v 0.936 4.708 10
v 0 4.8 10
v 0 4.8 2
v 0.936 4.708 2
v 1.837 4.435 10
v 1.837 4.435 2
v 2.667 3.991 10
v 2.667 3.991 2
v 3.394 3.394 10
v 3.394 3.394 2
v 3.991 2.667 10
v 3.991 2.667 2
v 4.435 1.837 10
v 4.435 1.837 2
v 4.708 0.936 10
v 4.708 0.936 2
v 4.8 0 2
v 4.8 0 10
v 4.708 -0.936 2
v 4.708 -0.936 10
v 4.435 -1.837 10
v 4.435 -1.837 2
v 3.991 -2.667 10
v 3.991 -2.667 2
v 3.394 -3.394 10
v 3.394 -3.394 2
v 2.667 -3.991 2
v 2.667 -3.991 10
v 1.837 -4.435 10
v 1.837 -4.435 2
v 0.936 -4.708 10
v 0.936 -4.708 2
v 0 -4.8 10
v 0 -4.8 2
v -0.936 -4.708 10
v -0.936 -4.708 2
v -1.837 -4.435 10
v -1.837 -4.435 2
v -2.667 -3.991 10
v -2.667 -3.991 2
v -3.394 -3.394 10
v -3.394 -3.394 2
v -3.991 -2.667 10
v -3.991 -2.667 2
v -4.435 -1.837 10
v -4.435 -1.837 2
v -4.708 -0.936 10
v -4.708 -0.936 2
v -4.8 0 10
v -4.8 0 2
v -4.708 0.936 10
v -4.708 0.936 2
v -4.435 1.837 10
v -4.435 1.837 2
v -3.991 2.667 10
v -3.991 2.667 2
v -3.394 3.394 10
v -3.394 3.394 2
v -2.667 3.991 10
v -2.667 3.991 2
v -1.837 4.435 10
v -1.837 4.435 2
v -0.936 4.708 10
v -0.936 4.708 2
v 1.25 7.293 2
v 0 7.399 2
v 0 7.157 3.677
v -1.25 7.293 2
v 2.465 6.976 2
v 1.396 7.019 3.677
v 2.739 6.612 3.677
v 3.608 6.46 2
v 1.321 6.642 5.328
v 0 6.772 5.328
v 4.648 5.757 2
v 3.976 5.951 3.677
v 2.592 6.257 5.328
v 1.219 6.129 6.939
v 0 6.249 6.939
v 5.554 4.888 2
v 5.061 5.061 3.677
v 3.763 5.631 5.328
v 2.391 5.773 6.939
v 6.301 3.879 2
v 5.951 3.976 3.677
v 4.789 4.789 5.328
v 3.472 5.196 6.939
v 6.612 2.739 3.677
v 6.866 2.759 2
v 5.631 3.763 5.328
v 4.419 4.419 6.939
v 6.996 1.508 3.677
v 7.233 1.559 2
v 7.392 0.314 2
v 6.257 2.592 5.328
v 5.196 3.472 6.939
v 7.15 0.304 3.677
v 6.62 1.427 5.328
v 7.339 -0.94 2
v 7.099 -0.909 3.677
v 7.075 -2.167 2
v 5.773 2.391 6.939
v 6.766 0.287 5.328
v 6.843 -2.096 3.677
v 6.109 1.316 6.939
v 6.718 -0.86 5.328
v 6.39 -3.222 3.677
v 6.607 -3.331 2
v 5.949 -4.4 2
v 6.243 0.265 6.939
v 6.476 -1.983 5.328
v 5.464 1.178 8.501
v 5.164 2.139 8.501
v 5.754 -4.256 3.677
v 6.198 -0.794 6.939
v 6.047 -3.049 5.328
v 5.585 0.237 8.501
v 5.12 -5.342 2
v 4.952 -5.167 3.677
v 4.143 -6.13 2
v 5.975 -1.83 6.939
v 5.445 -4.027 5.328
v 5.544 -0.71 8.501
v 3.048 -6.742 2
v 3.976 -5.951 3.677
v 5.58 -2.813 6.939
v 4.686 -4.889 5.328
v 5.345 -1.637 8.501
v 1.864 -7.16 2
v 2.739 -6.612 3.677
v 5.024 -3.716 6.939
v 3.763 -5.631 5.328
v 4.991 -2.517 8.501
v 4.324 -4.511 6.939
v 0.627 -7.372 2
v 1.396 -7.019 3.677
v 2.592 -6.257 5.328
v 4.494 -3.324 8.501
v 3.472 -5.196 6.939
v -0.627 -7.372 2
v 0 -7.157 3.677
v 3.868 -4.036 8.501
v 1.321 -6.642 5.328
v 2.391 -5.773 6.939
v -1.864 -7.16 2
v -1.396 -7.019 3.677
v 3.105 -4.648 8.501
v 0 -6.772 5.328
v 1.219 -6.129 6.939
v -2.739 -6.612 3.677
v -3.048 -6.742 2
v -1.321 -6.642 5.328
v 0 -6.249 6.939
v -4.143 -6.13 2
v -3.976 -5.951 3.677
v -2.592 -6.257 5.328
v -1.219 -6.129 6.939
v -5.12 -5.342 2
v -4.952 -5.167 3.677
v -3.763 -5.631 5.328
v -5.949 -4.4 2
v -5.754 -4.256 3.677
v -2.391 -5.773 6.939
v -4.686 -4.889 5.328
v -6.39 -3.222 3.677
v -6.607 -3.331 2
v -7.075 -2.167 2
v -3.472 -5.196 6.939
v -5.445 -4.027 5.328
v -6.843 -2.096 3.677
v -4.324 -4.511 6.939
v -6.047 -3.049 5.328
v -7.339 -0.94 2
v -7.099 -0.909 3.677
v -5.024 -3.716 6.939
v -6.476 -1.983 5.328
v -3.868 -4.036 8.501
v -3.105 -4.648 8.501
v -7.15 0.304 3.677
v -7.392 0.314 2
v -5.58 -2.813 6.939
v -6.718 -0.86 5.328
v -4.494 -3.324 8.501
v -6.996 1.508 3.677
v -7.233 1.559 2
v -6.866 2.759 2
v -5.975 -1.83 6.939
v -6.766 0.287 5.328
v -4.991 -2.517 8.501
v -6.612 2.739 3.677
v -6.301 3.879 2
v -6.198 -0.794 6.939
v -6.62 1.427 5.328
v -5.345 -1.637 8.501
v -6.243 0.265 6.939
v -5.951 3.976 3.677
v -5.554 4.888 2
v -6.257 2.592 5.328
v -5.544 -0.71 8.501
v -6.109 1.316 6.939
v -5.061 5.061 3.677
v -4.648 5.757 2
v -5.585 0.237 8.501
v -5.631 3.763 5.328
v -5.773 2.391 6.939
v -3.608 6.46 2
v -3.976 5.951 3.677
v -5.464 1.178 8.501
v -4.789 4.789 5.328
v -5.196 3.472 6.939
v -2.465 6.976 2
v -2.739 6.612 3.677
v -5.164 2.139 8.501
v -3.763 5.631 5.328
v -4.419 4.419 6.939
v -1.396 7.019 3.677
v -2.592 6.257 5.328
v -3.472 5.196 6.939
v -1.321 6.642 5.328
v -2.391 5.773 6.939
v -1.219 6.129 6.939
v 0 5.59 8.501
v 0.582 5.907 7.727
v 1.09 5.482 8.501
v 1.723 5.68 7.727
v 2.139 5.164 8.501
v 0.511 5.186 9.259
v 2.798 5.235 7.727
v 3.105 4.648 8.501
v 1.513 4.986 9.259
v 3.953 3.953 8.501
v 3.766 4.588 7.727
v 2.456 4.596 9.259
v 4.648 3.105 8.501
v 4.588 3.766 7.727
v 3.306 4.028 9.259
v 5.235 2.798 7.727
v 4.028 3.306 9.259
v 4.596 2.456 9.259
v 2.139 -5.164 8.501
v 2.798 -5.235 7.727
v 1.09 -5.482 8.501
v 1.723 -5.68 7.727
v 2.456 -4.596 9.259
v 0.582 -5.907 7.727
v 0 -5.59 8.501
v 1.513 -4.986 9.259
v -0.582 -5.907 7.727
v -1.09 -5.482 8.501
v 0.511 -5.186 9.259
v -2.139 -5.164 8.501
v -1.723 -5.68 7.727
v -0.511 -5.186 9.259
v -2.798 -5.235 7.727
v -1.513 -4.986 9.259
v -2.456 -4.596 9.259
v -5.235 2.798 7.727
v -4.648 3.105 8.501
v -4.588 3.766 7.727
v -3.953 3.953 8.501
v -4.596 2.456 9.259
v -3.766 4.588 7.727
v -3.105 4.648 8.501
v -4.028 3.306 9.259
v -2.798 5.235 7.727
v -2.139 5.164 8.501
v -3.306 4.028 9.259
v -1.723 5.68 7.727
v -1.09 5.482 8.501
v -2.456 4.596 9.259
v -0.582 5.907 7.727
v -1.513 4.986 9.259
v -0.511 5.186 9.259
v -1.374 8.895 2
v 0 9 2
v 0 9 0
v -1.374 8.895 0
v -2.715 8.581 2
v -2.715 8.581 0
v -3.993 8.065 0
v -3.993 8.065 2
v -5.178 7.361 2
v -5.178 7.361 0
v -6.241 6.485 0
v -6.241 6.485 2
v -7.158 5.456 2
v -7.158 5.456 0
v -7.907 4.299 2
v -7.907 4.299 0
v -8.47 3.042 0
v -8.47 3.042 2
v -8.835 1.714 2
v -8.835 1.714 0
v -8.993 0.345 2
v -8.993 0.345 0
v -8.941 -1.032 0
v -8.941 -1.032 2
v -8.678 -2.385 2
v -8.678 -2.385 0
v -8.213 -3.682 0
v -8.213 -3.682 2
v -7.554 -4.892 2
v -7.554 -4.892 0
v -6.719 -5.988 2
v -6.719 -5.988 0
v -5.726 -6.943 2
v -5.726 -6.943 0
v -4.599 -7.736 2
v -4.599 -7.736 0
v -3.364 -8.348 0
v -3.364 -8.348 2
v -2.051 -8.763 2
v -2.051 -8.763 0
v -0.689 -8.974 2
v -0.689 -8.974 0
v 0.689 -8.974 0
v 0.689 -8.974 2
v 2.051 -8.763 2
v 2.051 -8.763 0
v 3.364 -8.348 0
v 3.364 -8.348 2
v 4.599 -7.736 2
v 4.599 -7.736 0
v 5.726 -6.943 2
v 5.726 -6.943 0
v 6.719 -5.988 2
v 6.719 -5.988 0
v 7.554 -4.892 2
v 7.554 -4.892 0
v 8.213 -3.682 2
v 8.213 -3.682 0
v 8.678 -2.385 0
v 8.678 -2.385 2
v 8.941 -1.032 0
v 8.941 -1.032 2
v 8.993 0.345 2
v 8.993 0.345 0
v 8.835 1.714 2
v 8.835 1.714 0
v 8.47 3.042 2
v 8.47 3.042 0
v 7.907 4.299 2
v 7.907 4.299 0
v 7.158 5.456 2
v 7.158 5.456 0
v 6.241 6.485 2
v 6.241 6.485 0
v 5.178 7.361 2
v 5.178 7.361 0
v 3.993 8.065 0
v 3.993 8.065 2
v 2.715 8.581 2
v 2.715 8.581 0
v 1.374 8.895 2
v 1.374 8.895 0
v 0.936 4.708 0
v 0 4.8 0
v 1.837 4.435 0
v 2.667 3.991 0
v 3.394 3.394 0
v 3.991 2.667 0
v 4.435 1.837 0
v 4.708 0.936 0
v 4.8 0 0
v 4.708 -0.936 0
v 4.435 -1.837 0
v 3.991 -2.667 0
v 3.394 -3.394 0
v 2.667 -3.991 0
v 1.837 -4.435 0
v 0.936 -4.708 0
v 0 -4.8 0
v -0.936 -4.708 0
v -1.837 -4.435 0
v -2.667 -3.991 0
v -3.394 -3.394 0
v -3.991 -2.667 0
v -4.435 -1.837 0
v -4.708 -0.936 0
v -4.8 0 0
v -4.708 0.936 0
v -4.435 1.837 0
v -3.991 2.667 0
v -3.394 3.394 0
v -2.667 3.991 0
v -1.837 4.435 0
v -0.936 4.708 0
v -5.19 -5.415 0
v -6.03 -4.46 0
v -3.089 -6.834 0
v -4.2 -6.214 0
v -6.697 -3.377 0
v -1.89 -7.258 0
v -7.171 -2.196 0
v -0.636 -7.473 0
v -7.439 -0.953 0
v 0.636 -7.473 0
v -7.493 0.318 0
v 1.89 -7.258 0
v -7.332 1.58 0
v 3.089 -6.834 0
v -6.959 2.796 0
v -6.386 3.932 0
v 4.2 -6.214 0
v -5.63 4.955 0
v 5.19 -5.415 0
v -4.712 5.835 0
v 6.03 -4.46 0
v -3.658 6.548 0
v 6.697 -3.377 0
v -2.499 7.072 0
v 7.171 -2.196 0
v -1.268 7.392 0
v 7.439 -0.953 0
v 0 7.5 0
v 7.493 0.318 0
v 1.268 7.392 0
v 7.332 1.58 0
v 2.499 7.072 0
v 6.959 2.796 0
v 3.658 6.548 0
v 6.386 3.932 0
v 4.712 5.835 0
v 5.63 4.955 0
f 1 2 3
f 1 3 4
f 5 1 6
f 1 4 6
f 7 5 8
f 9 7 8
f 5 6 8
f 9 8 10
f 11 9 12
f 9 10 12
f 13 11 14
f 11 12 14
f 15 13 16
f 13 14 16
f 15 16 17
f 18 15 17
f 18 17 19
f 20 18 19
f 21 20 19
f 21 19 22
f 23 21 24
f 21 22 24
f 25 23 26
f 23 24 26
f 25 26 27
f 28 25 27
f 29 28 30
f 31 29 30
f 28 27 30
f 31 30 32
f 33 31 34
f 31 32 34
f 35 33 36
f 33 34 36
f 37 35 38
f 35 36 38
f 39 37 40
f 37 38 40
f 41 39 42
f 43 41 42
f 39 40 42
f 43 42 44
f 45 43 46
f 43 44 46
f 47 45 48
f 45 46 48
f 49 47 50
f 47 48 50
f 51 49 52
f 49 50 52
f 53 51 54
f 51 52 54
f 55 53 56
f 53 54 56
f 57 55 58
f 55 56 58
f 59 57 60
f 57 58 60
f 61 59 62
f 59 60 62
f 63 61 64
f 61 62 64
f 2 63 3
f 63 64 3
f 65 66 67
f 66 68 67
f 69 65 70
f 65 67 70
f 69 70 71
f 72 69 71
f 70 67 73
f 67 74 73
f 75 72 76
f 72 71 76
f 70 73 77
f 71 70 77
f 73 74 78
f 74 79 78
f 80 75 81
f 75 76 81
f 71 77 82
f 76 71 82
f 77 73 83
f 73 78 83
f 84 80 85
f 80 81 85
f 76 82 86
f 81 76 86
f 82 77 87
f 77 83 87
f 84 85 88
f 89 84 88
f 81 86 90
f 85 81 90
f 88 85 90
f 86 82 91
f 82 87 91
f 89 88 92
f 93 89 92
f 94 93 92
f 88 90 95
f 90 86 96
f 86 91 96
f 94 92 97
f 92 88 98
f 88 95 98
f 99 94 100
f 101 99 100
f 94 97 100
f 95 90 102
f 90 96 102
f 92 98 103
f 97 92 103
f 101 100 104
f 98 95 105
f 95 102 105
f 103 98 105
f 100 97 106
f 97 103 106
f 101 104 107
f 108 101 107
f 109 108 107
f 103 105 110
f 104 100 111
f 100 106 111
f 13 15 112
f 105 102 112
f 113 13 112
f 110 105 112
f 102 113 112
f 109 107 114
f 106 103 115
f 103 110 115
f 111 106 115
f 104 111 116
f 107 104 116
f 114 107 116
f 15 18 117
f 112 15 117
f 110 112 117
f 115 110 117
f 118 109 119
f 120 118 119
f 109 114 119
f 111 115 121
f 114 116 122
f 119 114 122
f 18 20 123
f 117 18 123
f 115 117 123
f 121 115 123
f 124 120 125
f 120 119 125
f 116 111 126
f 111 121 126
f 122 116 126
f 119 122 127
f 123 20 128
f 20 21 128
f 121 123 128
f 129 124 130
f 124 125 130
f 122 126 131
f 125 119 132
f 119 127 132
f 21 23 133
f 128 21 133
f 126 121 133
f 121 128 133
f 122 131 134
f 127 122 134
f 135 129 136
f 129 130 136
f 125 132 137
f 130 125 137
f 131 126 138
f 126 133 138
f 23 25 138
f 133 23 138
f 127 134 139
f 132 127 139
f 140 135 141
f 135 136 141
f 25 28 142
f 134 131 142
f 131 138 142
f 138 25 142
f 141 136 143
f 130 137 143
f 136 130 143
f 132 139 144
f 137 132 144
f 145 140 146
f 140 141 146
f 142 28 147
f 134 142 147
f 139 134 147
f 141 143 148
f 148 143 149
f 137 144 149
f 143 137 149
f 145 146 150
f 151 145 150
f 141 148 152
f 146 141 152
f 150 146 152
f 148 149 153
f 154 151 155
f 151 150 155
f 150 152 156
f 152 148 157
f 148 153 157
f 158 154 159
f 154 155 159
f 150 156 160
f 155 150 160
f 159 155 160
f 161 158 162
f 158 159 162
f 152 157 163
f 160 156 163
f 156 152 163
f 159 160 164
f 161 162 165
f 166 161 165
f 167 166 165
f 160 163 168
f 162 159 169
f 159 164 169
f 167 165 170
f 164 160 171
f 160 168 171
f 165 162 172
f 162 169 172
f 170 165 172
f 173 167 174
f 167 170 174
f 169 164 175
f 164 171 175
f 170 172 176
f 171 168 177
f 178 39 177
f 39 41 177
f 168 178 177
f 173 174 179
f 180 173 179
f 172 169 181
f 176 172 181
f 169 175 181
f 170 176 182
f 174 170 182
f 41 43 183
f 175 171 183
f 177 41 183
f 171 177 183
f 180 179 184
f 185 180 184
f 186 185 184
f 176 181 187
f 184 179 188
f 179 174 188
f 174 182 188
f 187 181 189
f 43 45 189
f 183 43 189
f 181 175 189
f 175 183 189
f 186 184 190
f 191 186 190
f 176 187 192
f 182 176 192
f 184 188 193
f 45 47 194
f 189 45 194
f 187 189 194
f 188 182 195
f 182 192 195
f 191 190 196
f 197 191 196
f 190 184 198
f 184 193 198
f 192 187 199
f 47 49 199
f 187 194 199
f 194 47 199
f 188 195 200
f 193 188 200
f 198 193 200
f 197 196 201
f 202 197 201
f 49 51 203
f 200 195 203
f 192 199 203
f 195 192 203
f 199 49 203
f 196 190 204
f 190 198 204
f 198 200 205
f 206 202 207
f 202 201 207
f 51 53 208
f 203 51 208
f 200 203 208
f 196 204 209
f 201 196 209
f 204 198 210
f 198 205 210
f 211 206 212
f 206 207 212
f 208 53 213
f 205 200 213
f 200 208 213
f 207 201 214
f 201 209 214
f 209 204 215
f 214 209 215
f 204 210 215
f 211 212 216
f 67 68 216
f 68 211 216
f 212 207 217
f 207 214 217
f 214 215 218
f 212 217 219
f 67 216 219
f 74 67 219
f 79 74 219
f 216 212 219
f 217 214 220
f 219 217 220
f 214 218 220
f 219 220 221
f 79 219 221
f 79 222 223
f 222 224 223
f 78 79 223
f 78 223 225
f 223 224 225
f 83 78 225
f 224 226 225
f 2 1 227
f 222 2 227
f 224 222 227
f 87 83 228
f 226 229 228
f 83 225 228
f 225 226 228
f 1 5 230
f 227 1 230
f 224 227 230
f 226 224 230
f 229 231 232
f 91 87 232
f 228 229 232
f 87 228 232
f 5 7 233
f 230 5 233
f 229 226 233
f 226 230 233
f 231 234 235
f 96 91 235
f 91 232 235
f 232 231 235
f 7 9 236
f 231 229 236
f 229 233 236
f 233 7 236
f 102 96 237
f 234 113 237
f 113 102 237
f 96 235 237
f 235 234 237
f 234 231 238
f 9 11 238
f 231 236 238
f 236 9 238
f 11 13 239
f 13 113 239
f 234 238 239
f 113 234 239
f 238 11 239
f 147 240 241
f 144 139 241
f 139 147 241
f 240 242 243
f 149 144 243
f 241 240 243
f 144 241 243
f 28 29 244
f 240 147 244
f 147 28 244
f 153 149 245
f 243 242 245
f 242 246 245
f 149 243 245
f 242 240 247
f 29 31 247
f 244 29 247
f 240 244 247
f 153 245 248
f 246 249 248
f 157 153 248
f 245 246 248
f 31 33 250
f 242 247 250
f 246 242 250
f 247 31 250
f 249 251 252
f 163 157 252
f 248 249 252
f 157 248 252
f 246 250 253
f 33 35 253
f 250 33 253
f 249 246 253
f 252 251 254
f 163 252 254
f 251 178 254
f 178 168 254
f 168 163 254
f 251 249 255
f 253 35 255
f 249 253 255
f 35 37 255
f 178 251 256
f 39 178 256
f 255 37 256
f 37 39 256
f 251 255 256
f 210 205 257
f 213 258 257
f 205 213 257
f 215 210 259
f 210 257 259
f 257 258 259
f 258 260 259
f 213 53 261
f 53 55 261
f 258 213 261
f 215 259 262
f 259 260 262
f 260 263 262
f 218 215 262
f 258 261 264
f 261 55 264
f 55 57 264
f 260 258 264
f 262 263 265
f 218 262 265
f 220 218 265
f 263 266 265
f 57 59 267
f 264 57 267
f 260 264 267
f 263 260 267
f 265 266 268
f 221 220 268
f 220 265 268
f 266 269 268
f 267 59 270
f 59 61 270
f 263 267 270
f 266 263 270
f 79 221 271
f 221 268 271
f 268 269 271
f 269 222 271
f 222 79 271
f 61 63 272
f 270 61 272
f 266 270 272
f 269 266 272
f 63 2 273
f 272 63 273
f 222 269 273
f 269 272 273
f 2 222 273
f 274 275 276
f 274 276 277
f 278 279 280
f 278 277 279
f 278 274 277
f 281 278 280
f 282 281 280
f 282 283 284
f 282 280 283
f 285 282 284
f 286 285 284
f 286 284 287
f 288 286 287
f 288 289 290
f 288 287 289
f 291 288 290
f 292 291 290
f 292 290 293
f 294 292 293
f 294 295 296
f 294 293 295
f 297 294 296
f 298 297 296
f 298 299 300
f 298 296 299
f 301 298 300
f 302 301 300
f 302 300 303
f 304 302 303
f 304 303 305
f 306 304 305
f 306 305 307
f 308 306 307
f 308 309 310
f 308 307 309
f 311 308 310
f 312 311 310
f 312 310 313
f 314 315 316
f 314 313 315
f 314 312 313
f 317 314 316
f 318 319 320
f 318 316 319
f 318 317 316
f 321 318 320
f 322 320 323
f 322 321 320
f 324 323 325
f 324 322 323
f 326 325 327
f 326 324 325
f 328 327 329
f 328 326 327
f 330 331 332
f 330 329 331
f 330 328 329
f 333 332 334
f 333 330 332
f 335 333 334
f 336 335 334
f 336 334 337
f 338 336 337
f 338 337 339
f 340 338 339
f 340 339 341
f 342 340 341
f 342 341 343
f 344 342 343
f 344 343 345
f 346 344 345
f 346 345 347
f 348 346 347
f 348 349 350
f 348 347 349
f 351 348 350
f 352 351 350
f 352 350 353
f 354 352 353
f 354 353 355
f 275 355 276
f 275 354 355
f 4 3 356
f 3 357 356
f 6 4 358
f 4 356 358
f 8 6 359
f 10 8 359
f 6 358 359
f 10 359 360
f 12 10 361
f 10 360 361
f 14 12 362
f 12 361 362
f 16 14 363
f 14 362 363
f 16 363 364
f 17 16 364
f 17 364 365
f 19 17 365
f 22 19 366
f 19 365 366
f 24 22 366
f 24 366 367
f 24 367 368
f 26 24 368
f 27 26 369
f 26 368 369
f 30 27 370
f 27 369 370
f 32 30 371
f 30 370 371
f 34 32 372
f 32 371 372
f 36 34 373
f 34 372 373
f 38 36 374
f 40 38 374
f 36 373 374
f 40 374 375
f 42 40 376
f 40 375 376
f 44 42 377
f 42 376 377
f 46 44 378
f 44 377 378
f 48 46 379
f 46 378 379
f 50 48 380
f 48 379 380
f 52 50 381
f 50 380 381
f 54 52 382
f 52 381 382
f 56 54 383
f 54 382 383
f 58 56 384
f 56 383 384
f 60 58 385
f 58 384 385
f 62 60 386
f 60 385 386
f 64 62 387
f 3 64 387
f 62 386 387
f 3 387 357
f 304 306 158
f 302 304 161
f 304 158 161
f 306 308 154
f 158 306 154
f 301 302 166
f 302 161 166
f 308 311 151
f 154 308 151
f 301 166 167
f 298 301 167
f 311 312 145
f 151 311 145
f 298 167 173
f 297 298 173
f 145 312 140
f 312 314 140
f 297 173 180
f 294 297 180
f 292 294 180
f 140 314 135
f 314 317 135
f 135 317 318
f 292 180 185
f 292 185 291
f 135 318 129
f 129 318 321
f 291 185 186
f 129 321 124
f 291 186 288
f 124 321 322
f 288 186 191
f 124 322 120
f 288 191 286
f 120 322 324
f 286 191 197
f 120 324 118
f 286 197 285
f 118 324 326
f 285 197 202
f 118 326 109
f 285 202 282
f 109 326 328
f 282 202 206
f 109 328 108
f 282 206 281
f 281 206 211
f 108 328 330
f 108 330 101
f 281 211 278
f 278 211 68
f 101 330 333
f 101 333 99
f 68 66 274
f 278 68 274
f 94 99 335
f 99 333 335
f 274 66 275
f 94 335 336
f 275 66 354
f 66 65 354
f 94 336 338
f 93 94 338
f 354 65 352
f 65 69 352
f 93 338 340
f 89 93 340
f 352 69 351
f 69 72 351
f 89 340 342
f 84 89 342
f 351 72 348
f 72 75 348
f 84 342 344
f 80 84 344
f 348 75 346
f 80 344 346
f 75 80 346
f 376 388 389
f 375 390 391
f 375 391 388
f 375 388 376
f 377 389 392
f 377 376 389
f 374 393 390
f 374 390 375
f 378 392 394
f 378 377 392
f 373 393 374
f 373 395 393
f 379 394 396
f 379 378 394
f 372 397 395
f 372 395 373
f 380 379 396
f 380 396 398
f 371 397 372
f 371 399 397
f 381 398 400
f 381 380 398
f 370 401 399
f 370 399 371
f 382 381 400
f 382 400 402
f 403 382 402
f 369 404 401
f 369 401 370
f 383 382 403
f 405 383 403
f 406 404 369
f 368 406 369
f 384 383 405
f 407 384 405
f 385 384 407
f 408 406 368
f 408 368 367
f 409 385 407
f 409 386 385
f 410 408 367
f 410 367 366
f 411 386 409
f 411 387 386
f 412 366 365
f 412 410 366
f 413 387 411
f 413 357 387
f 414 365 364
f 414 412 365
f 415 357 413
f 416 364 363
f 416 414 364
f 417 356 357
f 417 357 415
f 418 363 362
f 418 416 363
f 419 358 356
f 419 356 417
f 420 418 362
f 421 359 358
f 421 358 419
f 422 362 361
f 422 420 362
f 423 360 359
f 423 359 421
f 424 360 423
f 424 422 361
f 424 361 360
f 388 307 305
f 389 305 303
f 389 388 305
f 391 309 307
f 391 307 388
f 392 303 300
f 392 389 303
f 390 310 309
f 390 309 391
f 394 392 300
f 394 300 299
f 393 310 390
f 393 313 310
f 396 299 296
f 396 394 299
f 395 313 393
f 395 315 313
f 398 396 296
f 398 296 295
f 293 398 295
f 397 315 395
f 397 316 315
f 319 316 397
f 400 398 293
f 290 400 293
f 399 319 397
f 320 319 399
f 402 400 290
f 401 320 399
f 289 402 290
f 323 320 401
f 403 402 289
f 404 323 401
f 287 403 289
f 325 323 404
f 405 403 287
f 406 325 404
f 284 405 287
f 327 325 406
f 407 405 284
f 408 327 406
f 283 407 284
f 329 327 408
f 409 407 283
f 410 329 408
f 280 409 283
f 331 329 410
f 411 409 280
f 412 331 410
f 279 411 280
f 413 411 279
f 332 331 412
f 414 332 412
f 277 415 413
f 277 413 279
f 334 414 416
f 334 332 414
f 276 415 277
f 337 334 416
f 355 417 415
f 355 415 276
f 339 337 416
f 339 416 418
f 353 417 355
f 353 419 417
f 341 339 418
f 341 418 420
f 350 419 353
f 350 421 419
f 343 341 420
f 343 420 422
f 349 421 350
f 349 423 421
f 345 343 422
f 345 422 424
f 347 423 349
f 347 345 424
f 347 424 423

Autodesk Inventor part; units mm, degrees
ref_plane "YZ Plane" through (0, 0, 0) normal (1, 0, 0) x (0, 1, 0)
ref_plane "XZ Plane" through (0, 0, 0) normal (0, 1, 0) x (-1, 0, 0)
ref_plane "XY Plane" through (0, 0, 0) normal (0, 0, 1) x (1, 0, 0)
sketch "Sketch1" plane through (0, 0, 0) normal (1, 0, 0) x (0, 1, 0)
  line L0 (0, 0) -> (7.5, 0) construction
  arc A0 (7.5, 0) -> (4.8, 10) centre (-12.3685, 0) ccw
  line L1 (0, 3.5) -> (0, 0) construction
  line L2 (4.8, 10) -> (4.8, 10)
  line L3 (7.5, 0) -> (4.8, 0)
  line L4 (4.8, 10) -> (4.8, 0)
  line L5 (4.8, 0) -> (9, 0)
  line L6 (9, 0) -> (9, 2)
  line L7 (9, 2) -> (4.8, 2)
  line L8 (4.8, 2) -> (4.8, 0)
  point P0 (0, 6.2097)
  dimension "d1" = 7.5
  dimension "d10" = 10
  dimension "d11" = 0
  dimension "d12" = 4.8
  dimension "d13" = 2
  dimension "d15" = 9
revolve "Revolution1" add sketch "Sketch1" angle 360 about axis through (0, 0, 3.5) along (0, 0, -1)
properties part number "brush fitting partb v5"
